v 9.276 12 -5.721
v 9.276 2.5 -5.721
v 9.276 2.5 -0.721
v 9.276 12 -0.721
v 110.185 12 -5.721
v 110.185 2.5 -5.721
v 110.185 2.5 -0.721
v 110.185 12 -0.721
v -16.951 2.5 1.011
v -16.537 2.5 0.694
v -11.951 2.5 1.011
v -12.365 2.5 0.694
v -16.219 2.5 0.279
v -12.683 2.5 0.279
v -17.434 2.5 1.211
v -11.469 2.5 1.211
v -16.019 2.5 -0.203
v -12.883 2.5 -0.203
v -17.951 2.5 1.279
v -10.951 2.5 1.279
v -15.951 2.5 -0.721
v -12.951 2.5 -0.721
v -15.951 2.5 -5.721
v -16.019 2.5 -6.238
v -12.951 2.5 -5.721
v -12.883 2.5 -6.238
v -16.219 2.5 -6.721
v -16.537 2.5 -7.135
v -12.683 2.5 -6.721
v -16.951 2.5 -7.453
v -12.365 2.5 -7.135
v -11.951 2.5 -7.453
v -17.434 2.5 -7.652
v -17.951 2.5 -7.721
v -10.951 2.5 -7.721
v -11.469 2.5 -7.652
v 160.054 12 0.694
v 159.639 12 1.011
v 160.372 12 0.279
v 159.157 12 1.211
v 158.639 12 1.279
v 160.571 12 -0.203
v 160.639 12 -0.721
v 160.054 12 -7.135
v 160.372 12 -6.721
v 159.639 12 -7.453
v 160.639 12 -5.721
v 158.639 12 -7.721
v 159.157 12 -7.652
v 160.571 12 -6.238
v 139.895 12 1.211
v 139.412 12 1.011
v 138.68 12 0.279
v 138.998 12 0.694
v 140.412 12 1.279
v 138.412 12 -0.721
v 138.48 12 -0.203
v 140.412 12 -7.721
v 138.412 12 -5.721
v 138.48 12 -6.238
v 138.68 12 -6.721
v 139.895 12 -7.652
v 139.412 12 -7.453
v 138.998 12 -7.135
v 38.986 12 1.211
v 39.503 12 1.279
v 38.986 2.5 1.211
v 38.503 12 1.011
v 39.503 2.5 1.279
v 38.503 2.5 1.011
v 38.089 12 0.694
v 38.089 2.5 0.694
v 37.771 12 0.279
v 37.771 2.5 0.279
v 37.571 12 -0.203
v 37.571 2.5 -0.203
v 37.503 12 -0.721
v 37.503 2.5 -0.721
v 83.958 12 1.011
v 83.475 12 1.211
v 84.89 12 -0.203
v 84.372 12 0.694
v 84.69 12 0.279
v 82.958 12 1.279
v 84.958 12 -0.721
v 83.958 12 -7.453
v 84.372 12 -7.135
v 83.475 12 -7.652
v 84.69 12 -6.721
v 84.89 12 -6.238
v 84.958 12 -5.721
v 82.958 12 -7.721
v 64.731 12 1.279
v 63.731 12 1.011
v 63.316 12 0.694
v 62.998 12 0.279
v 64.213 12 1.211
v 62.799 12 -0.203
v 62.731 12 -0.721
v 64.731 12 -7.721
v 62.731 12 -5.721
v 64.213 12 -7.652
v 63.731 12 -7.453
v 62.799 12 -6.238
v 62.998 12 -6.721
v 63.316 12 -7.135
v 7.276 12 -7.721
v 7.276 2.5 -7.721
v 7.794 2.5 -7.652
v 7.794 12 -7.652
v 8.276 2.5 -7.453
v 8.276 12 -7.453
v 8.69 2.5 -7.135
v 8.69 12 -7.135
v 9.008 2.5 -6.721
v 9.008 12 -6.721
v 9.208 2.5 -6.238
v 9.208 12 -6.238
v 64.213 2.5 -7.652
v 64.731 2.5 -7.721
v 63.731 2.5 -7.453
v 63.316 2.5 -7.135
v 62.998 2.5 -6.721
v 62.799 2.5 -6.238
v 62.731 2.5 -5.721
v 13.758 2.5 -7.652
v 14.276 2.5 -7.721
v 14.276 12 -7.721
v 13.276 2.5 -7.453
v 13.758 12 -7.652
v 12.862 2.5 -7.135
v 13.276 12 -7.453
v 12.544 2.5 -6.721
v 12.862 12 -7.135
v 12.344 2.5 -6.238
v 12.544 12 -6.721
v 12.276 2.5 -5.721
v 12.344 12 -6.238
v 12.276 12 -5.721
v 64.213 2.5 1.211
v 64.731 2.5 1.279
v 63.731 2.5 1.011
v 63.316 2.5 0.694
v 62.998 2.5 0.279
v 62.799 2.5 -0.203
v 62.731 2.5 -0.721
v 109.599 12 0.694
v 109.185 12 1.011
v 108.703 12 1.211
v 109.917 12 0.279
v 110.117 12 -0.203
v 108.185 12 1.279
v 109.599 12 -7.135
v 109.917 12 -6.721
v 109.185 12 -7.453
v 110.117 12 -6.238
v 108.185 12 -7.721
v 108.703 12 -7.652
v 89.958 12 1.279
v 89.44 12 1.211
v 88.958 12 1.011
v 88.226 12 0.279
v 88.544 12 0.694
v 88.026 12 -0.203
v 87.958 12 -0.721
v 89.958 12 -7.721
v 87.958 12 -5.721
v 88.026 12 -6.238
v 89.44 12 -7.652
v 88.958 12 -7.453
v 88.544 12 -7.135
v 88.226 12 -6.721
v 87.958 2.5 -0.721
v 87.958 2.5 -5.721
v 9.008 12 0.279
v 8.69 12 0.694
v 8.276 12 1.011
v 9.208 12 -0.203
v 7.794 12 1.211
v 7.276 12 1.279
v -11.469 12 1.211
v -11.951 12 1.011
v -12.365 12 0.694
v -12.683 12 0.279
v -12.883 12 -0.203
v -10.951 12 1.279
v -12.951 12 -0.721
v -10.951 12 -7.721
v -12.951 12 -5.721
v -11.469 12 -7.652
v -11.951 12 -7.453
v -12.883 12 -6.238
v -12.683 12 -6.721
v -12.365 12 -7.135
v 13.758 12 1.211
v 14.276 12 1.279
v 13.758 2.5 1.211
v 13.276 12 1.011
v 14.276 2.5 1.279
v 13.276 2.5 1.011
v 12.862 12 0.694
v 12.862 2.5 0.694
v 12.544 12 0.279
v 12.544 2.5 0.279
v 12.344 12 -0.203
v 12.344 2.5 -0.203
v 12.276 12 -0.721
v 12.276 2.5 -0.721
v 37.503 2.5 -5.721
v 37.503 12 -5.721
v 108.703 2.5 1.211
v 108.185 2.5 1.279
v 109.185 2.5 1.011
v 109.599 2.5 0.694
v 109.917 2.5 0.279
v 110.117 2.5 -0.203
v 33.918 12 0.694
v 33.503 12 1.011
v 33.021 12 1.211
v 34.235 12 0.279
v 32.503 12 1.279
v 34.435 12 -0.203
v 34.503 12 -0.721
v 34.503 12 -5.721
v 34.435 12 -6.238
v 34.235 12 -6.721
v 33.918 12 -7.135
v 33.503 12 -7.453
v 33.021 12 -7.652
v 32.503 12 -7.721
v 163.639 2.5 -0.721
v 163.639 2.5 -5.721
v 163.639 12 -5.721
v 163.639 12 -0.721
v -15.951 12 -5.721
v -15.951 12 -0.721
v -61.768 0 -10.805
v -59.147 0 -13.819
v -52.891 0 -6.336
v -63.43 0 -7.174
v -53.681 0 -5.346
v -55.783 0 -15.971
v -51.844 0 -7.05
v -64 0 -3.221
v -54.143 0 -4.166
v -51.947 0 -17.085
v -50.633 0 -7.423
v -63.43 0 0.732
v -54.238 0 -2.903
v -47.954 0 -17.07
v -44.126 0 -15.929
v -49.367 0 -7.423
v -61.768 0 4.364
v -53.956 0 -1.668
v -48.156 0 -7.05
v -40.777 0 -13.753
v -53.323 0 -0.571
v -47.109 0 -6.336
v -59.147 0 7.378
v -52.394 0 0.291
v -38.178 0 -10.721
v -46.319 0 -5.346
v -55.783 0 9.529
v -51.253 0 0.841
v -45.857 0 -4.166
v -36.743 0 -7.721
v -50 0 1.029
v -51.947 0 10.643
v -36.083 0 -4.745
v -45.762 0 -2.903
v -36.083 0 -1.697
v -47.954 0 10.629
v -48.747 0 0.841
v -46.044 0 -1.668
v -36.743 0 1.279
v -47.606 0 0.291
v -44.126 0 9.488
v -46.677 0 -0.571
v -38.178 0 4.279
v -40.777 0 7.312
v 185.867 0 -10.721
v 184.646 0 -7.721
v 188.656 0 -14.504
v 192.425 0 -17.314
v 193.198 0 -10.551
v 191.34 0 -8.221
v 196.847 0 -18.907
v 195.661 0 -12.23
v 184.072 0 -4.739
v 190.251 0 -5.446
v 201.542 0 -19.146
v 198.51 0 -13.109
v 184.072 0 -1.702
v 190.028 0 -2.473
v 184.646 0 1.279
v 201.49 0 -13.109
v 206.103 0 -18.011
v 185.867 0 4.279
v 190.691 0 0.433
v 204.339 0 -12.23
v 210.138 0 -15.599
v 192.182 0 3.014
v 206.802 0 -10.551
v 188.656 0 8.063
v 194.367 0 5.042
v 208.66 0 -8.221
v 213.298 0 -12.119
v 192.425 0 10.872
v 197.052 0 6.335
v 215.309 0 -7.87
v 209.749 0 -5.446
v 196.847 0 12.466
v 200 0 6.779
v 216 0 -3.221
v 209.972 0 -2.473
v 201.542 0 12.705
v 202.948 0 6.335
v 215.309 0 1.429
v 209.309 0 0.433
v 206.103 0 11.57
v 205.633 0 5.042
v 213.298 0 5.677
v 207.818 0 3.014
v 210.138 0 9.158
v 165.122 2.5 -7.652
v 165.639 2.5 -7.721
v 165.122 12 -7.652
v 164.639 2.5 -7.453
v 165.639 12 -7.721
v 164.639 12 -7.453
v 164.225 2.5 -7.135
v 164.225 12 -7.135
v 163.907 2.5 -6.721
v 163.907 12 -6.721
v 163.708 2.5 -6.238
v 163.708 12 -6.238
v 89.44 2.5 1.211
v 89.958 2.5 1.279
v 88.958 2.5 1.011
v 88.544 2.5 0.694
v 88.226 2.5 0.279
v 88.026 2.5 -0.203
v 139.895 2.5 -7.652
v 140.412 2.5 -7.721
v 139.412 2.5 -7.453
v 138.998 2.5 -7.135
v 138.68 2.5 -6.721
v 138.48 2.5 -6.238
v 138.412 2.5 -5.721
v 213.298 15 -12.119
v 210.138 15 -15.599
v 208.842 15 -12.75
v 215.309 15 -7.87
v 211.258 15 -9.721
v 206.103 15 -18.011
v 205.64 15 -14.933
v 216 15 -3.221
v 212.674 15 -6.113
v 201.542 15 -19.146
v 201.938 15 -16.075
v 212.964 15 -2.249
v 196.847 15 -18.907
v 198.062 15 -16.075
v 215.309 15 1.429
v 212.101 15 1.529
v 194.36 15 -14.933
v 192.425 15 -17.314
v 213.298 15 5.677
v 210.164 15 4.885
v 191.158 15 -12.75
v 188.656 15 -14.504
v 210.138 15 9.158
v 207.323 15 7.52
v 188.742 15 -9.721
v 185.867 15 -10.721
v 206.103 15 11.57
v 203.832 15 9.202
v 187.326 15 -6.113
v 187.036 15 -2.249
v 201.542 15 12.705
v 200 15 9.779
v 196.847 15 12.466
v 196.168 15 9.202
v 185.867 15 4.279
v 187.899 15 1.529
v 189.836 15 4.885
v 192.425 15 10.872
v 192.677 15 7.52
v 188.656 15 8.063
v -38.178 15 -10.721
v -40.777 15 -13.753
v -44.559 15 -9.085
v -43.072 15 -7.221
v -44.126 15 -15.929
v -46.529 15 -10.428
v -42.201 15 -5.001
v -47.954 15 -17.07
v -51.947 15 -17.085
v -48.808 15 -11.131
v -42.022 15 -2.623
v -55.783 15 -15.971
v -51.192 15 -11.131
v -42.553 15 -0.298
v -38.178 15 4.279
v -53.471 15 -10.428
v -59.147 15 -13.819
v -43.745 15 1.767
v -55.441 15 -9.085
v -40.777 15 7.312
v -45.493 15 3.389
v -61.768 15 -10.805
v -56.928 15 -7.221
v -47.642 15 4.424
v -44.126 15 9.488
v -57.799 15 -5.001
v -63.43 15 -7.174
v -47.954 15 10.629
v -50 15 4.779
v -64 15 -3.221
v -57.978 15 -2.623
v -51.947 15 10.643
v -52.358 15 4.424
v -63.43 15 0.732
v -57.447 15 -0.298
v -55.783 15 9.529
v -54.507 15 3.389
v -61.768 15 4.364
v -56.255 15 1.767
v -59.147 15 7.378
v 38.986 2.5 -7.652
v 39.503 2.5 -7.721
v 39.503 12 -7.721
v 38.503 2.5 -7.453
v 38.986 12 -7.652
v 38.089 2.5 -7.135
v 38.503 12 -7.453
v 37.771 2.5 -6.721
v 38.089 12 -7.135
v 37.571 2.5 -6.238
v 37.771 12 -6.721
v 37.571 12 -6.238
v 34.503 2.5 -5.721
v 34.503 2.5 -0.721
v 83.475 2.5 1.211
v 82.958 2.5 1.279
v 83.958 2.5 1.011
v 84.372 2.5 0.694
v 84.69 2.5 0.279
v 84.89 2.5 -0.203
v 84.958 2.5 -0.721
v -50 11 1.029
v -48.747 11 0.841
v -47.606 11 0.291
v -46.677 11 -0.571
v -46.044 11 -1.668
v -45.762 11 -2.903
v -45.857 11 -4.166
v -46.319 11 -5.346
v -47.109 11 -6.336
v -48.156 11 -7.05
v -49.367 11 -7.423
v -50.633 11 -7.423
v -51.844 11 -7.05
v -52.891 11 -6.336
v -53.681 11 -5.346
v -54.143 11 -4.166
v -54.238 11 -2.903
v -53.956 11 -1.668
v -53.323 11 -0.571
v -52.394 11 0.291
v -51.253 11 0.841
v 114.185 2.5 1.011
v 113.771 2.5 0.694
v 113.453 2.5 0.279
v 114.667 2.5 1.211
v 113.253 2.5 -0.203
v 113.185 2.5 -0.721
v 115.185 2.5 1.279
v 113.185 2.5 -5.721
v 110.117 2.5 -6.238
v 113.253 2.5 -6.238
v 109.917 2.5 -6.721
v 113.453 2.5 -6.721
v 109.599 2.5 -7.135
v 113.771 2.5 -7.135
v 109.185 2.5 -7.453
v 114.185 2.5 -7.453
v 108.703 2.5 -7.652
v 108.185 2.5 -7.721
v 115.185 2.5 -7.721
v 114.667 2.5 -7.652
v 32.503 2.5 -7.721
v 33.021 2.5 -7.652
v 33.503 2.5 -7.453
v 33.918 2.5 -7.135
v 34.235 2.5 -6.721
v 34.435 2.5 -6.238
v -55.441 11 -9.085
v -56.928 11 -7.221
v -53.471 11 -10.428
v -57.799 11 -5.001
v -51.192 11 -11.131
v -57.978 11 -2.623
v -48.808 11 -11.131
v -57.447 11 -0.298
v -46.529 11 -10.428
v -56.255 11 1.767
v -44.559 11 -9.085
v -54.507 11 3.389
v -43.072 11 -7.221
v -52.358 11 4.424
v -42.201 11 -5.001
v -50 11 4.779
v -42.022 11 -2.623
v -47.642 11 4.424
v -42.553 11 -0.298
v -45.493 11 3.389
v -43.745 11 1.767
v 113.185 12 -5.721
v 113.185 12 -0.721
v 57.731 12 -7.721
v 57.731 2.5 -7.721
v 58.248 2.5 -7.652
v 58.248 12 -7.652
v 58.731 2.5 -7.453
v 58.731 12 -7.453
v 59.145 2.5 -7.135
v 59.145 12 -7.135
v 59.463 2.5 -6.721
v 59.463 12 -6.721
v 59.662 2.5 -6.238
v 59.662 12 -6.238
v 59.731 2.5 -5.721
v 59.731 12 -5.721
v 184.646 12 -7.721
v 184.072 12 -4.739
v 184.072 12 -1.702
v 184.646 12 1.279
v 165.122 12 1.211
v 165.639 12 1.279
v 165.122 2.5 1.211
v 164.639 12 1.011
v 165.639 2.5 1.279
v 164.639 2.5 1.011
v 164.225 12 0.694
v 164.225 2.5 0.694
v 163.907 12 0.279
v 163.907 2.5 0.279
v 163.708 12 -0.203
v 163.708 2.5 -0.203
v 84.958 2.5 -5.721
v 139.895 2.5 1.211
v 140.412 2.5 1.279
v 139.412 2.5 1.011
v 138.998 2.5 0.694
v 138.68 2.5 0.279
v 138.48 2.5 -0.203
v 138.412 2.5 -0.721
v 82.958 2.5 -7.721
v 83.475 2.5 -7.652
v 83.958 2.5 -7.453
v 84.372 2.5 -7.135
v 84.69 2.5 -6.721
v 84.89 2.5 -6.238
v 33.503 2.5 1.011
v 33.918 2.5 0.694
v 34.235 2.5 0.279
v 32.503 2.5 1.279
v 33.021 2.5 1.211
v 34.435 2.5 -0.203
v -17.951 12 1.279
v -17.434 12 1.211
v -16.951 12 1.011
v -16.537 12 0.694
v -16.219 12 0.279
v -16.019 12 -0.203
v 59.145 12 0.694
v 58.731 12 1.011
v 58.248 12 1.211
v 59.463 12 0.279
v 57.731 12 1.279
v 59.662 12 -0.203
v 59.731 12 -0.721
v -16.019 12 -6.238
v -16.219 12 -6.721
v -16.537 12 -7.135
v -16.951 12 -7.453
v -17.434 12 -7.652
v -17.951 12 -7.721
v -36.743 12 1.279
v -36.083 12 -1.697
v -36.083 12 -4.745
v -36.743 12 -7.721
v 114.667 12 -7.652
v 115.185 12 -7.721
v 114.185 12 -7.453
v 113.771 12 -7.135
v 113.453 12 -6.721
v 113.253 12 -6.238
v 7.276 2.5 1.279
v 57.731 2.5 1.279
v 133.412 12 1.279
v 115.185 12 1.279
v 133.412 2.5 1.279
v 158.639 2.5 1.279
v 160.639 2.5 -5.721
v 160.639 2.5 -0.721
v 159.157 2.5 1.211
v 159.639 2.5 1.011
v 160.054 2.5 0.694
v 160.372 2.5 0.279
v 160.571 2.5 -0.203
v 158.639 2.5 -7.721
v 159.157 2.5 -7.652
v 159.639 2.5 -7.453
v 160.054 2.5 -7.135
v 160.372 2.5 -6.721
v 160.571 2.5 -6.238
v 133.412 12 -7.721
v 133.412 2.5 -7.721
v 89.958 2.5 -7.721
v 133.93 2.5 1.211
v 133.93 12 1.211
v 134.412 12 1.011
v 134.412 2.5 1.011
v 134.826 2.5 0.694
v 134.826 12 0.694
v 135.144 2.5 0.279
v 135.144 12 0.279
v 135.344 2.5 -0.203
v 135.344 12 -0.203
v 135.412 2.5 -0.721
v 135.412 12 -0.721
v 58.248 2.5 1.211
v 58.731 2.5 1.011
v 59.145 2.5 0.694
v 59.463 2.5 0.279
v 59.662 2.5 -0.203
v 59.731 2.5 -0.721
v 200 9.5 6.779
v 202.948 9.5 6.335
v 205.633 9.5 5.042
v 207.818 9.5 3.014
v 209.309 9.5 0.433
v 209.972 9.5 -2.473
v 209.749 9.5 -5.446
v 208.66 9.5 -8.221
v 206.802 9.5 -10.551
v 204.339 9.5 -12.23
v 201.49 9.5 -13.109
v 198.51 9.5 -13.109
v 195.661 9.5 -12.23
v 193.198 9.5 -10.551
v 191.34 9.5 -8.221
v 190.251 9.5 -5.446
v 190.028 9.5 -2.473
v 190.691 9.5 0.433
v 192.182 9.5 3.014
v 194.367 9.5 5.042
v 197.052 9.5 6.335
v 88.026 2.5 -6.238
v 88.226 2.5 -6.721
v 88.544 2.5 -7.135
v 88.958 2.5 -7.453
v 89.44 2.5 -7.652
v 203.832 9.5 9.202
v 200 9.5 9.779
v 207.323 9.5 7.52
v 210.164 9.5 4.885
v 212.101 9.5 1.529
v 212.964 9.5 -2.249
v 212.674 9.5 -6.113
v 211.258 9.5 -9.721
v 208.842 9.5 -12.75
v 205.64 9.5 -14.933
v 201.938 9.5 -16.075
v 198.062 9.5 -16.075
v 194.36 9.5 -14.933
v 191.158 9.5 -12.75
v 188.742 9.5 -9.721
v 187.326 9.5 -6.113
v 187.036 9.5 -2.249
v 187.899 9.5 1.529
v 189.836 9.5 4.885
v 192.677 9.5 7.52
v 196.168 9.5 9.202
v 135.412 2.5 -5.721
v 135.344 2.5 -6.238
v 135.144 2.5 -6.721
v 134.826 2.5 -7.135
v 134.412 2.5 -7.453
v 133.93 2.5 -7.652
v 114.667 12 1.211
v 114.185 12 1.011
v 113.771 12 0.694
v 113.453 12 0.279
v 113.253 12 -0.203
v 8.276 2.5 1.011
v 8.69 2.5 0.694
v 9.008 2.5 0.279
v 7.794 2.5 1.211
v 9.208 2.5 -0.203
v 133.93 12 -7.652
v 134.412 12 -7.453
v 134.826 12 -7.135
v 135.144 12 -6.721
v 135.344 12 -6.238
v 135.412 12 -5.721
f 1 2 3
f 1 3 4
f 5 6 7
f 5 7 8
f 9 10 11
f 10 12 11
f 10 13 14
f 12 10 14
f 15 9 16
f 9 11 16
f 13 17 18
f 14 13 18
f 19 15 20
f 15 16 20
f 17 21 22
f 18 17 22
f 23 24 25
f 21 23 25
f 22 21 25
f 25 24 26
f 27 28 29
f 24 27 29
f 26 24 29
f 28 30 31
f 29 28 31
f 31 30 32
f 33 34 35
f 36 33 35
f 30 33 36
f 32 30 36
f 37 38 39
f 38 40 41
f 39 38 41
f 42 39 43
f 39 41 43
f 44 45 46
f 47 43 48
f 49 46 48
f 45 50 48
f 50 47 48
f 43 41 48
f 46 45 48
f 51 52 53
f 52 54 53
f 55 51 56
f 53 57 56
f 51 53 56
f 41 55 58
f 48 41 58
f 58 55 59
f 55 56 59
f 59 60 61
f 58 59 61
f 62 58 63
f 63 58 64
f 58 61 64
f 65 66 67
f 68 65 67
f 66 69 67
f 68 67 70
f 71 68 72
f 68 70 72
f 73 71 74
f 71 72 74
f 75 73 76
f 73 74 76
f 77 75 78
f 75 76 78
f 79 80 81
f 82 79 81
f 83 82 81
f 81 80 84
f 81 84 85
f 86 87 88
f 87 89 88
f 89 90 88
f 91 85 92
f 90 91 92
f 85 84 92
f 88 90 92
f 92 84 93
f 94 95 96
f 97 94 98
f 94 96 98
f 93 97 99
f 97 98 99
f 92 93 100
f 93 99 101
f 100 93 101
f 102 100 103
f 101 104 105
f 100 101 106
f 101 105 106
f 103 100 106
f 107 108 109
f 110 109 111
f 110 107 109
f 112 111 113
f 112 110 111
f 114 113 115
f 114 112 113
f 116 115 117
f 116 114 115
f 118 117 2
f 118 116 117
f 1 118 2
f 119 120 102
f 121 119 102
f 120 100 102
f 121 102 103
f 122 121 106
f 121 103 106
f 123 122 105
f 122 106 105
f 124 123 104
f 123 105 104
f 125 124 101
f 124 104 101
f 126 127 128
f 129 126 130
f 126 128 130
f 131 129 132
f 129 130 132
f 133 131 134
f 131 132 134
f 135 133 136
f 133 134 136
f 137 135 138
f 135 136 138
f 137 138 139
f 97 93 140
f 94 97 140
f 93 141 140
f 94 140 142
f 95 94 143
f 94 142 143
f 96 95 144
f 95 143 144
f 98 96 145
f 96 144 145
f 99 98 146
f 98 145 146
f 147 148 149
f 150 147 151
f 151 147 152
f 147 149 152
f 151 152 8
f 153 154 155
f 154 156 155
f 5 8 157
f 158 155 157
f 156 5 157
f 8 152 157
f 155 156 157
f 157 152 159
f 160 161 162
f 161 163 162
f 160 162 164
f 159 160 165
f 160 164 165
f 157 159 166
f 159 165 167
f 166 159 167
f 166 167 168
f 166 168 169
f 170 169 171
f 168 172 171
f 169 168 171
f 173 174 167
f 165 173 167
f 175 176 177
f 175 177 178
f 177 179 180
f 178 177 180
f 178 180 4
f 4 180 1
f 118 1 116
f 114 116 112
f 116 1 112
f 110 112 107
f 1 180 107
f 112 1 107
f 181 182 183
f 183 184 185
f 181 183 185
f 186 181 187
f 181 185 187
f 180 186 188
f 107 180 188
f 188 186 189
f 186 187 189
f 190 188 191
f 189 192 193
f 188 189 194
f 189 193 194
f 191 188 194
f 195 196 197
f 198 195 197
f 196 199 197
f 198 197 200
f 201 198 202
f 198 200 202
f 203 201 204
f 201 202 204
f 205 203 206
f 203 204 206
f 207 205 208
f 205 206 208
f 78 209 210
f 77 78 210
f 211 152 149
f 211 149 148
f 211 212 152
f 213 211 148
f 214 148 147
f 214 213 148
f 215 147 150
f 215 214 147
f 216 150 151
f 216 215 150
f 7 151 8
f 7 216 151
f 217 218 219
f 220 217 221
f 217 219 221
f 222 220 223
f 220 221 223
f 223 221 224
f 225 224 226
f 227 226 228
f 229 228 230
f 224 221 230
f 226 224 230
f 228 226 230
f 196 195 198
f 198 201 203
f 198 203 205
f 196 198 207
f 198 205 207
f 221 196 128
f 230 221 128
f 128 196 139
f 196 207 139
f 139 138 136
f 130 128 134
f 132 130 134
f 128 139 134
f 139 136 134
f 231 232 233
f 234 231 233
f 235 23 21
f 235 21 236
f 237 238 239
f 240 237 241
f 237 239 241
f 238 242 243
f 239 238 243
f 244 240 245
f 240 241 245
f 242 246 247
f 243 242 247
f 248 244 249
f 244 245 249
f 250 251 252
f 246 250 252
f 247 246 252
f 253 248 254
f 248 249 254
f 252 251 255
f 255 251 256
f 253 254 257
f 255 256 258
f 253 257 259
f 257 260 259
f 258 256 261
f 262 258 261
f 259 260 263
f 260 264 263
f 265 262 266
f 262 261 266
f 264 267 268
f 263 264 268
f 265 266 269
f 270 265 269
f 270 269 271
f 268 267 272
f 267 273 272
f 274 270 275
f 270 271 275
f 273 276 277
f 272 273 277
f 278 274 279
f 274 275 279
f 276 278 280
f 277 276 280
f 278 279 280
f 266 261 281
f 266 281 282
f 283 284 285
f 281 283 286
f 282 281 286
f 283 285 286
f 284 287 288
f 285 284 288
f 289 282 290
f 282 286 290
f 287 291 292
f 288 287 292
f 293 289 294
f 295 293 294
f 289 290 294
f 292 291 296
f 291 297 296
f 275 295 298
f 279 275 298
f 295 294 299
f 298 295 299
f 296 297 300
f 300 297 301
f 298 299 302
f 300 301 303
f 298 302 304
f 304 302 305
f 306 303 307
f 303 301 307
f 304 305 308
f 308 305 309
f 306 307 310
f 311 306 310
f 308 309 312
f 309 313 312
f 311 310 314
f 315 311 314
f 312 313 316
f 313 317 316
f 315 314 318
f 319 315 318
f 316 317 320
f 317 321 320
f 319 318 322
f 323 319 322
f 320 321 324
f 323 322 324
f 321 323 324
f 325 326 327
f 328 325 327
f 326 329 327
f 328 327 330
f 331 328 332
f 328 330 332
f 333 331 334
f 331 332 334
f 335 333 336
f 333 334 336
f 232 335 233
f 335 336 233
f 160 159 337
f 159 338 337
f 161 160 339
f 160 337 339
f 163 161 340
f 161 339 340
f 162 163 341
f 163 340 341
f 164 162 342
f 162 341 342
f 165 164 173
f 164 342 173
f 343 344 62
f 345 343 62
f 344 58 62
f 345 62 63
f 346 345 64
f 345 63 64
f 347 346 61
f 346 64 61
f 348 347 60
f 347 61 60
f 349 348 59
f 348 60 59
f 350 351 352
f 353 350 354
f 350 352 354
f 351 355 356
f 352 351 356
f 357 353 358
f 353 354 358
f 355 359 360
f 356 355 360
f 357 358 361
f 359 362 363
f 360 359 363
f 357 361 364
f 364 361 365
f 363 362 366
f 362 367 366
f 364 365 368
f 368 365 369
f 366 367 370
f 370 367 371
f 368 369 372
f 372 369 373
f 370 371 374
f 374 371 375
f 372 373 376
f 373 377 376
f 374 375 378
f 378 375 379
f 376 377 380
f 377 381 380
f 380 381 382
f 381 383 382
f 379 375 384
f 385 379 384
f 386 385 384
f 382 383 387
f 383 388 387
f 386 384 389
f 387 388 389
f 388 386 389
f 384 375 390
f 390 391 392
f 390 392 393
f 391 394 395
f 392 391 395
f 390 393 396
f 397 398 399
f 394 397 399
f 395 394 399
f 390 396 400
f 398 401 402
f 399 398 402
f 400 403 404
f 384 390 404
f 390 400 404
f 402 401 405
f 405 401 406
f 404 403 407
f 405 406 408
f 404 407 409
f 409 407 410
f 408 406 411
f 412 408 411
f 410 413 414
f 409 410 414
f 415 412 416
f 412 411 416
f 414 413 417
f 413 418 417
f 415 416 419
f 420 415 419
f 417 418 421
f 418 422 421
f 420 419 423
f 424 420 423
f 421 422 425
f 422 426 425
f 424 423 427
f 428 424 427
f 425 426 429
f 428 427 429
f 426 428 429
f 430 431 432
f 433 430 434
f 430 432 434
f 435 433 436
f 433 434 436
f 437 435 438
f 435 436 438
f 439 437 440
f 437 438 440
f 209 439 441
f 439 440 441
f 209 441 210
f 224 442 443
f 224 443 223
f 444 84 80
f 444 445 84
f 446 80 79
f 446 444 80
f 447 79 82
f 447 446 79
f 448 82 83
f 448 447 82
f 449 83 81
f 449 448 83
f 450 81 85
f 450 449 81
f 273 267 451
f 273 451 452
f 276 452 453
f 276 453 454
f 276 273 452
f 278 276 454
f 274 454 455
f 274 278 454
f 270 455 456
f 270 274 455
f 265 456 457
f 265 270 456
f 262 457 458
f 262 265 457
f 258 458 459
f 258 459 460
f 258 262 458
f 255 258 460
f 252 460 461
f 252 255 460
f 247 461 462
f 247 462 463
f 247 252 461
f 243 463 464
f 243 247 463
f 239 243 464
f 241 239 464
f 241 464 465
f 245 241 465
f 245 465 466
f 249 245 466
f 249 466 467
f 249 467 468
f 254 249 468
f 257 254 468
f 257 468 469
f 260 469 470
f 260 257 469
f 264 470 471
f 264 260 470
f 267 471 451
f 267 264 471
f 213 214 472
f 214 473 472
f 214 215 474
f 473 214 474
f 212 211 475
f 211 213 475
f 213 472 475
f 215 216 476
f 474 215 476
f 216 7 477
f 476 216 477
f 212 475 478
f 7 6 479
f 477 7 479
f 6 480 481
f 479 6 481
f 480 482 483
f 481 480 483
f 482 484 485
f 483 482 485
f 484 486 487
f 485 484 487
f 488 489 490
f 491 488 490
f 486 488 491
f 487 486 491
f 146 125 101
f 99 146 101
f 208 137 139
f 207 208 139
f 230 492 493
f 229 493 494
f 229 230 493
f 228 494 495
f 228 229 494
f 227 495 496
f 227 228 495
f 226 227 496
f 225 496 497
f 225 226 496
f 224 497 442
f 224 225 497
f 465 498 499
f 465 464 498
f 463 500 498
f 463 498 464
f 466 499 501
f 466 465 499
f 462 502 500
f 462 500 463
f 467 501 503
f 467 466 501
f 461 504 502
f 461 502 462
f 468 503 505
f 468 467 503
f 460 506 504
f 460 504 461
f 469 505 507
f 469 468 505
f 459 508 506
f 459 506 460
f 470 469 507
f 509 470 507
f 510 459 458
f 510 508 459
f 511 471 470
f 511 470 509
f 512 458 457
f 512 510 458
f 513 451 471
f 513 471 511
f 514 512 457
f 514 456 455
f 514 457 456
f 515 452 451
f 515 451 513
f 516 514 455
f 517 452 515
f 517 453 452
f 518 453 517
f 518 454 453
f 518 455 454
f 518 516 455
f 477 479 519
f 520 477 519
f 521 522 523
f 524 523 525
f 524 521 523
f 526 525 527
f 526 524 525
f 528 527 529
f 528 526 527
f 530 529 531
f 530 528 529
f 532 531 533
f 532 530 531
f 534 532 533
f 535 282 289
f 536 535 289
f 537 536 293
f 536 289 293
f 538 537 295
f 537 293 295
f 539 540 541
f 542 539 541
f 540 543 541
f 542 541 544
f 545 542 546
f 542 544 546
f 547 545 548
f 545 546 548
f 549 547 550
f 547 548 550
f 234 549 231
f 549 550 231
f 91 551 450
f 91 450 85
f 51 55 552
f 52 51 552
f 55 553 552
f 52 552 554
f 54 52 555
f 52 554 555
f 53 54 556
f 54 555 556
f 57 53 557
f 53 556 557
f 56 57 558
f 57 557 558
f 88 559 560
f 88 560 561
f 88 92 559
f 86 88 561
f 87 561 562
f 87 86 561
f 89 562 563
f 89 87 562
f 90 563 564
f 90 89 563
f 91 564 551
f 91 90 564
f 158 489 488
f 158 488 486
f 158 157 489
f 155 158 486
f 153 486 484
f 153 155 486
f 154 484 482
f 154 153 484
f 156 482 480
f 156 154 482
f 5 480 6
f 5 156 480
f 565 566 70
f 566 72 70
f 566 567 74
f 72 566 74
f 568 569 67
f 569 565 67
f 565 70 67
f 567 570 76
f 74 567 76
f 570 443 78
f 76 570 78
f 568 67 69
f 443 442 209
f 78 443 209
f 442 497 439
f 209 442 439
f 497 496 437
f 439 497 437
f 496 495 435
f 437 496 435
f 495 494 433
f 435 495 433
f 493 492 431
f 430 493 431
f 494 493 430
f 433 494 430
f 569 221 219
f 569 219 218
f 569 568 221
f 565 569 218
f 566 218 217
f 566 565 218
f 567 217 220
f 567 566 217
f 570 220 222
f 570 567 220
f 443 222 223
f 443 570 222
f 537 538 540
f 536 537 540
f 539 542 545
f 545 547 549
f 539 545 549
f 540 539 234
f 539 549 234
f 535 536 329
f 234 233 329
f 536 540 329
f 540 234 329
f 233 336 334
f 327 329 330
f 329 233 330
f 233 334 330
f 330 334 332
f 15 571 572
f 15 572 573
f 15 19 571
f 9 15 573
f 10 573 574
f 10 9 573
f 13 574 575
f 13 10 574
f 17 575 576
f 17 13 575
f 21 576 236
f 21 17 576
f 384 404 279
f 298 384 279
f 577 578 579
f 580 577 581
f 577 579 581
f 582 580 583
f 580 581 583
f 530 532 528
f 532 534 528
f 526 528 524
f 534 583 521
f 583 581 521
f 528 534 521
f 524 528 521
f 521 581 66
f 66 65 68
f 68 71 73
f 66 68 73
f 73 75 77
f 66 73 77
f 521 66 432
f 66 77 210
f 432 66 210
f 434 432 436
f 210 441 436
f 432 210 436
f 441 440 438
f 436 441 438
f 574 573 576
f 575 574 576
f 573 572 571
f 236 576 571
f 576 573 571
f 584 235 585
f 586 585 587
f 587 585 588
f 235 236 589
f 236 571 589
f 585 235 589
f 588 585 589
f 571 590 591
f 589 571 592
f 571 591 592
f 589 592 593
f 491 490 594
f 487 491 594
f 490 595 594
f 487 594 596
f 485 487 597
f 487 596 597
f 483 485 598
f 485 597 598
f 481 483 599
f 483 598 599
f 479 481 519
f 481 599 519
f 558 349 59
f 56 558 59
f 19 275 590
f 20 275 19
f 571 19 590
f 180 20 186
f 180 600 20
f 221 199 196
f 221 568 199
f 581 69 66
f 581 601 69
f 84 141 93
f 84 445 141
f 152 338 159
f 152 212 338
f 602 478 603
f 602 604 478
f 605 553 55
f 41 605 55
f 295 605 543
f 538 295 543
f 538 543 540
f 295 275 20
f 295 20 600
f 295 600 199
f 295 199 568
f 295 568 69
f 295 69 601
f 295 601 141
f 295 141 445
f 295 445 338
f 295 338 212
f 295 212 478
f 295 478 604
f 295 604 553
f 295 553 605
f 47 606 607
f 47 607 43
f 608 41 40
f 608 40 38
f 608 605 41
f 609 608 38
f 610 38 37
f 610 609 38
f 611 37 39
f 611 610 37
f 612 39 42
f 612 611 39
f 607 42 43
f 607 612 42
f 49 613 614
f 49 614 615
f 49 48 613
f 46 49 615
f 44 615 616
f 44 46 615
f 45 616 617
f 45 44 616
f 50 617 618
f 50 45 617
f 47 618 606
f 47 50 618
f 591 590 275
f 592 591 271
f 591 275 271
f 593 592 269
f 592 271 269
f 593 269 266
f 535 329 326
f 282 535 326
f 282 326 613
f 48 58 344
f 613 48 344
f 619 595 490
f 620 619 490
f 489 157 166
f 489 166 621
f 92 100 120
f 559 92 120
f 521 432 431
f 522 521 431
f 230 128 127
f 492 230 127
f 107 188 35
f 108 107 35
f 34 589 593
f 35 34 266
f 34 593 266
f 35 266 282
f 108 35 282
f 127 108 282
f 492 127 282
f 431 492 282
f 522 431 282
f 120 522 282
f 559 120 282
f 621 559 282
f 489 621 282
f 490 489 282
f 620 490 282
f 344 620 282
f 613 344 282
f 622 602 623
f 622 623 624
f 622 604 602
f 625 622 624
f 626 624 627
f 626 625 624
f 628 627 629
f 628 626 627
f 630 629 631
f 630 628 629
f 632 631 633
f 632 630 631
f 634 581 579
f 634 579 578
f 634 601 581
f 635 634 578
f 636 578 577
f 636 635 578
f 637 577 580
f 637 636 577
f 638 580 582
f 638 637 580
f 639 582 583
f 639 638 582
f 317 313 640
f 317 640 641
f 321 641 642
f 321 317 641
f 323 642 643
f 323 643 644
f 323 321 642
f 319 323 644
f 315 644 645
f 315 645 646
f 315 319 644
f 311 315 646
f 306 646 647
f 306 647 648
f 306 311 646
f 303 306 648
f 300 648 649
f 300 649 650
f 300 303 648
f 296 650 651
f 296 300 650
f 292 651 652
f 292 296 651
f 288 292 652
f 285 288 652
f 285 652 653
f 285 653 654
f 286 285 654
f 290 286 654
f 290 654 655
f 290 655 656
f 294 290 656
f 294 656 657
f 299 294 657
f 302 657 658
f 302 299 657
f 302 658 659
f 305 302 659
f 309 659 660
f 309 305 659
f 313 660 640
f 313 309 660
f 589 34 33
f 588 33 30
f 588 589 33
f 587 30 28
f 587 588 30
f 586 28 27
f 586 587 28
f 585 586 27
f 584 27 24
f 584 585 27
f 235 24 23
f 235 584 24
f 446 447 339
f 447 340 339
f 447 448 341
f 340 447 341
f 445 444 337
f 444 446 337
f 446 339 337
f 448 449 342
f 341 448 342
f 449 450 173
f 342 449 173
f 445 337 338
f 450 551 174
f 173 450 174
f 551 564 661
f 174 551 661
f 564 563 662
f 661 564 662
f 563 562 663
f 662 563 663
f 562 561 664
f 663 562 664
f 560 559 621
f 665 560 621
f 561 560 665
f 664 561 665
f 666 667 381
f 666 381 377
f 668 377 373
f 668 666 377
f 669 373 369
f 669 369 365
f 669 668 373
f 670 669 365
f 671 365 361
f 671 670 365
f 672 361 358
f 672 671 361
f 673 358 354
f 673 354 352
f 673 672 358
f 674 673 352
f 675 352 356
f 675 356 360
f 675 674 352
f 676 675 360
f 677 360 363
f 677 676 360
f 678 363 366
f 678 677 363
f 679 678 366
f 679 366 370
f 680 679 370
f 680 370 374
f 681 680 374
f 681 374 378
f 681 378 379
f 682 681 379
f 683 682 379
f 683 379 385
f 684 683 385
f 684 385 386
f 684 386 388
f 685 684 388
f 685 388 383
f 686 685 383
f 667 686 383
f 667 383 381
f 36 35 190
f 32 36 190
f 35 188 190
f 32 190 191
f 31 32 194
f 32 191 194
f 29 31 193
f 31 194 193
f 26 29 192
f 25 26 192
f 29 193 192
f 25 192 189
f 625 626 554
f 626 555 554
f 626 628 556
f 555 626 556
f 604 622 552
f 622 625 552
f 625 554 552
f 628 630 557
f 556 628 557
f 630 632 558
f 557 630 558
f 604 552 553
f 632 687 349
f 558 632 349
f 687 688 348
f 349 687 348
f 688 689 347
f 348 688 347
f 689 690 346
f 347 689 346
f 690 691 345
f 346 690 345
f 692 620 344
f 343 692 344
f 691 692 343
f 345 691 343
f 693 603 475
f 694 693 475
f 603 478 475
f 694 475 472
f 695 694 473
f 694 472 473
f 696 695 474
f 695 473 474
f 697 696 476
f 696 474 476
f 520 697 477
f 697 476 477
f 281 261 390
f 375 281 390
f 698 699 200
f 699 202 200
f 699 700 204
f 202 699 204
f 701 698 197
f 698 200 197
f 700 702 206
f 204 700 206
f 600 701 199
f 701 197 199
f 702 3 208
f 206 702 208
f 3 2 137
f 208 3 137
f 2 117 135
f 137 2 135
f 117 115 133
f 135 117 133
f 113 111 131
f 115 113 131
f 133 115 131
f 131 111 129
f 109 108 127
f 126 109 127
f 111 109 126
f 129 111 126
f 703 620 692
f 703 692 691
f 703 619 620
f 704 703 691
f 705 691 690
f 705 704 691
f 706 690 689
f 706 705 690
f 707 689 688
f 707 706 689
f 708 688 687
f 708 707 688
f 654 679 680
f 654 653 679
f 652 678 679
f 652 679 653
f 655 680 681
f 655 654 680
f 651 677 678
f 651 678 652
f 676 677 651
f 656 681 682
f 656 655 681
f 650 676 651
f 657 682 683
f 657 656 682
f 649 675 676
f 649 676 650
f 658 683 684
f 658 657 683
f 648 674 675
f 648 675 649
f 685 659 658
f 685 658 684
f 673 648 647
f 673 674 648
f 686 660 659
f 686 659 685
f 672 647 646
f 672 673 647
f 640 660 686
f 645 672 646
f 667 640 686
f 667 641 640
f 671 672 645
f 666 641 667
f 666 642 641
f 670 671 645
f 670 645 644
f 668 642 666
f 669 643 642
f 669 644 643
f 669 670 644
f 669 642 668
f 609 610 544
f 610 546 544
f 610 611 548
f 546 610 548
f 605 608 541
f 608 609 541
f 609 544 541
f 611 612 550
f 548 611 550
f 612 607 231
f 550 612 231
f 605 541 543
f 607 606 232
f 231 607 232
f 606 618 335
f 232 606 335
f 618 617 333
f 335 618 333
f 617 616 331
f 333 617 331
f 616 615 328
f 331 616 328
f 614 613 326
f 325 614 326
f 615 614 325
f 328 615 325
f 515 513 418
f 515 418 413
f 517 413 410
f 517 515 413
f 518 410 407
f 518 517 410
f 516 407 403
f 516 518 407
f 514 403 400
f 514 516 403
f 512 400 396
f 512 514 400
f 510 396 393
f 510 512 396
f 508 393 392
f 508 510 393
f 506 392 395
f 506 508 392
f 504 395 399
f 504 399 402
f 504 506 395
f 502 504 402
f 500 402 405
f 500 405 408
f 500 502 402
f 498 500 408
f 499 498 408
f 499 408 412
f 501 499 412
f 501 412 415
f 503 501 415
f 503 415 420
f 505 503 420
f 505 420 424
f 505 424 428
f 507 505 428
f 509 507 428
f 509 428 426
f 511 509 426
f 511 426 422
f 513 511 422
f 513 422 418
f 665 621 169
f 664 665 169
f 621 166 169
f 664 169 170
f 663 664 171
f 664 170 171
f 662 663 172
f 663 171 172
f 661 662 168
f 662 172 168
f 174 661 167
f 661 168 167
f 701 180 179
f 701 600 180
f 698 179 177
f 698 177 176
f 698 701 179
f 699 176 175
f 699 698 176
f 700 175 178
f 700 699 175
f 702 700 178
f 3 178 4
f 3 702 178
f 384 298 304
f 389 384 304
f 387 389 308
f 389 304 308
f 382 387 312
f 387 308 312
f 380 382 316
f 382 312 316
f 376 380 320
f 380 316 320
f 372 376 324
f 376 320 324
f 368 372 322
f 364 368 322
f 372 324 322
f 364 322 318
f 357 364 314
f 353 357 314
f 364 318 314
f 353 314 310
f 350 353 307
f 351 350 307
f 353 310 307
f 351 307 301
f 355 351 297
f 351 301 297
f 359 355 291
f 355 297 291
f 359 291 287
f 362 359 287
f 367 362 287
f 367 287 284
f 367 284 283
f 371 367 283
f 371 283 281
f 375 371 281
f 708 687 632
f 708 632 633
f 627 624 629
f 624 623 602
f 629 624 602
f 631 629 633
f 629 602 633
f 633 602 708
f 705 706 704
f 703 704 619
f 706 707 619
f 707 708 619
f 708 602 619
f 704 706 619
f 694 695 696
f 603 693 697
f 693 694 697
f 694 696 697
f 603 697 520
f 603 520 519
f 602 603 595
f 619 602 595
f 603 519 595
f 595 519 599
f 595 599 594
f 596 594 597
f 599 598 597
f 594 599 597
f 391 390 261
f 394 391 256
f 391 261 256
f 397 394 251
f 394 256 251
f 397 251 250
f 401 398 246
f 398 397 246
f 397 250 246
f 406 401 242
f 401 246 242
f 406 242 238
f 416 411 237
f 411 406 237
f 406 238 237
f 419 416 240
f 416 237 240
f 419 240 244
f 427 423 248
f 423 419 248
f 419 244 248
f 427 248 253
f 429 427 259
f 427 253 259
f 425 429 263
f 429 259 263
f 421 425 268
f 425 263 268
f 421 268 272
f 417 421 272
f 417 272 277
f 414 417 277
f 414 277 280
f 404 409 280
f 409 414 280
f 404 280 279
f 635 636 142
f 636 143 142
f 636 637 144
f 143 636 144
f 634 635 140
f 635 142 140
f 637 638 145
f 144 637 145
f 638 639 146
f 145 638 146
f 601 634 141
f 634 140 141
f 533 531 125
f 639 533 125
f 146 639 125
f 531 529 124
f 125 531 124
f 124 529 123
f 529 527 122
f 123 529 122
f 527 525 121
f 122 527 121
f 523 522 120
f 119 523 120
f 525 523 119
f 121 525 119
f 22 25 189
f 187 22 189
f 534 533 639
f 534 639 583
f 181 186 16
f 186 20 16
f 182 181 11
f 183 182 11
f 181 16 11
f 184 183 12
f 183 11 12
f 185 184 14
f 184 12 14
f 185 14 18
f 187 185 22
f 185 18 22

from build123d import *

# Parameters (mm, degrees)
SKETCH2_R                             = 14
SKETCH2_R_2                           = 8
BOSS_EXTRUDE7_DEPTH                   = 15
SKETCH2_9_R                           = 16
SKETCH2_9_R_2                         = 13
BOSS_EXTRUDE8_DEPTH                   = 15
SKETCH2_11_R                          = 13
SKETCH2_11_R_2                        = 10
BOSS_EXTRUDE9_DEPTH                   = 9.5
BOSS_EXTRUDE11_REACH                  = 219.372
BOSS_EXTRUDE11_END_RADIUS             = 14
BOSS_EXTRUDE11_DIRECTION_2_REACH      = 219.372
BOSS_EXTRUDE11_DIRECTION_2_END_RADIUS = 16
BOSS_EXTRUDE12_REACH                  = 219.489
SKETCH15_W                            = 3
SKETCH15_H                            = 9.5
FILLET1_R                             = 2
SKETCH2_13_R                          = 8
SKETCH2_13_R_2                        = 4.25
BOSS_EXTRUDE13_DEPTH                  = 11


with BuildPart() as part:
    # Sketch2 → Boss-Extrude7 (new body)
    with BuildSketch(Plane(origin=(0, 0, 0), x_dir=(1, 0, 0), z_dir=(0, 1, 0))):
        with Locations(Location((-50, 3.220631283, 0), (0, 0, 270))):
            Circle(SKETCH2_R)
        with Locations(Location((-50, 3.220631283, 0), (0, 0, 270))):
            Circle(SKETCH2_R_2, mode=Mode.SUBTRACT)
    extrude(amount=BOSS_EXTRUDE7_DEPTH)


with BuildPart() as body_2:
    # Sketch2<9> → Boss-Extrude8 (new body)
    with BuildSketch(Plane(origin=(0, 0, 0), x_dir=(1, 0, 0), z_dir=(0, 1, 0))):
        with Locations(Location((200, 3.220631283, 0), (0, 0, 270))):
            Circle(SKETCH2_9_R)
        with Locations(Location((200, 3.220631283, 0), (0, 0, 270))):
            Circle(SKETCH2_9_R_2, mode=Mode.SUBTRACT)
    extrude(amount=BOSS_EXTRUDE8_DEPTH)

    # Sketch2<11> → Boss-Extrude9 (add)
    with BuildSketch(Plane(origin=(0, 0, 0), x_dir=(1, 0, 0), z_dir=(0, 1, 0))):
        with Locations(Location((200, 3.220631283, 0), (0, 0, 270))):
            Circle(SKETCH2_11_R)
        with Locations(Location((200, 3.220631283, 0), (0, 0, 270))):
            Circle(SKETCH2_11_R_2, mode=Mode.SUBTRACT)
    extrude(amount=BOSS_EXTRUDE9_DEPTH)


    add(part.part)  # Boss-Extrude11 merges part
    # Boss-Extrude11: up to this cylinder (the profile starts outside it)
    boss_extrude11_end = Plane(origin=(-50, 0.212132, -3.220631283), z_dir=(0, -1, 0)) * Cylinder(BOSS_EXTRUDE11_END_RADIUS, 467.744, mode=Mode.PRIVATE)
    # Sketch3 → Boss-Extrude11 (add, up to the surface)
    with BuildSketch(Plane(origin=(0, 0, 0), x_dir=(0, 0, -1), z_dir=(1, 0, 0)), mode=Mode.PRIVATE) as boss_extrude11_sk1:
        Polygon((10.720631283, 0), (10.720631283, 15), (-4.279368717, 15), (-4.279368717, 0), (-1.279368717, 0), (-1.279368717, 12), (7.720631283, 12), (7.720631283, 0), align=None)
    boss_extrude11_tool1 = extrude(boss_extrude11_sk1.sketch, amount=-BOSS_EXTRUDE11_REACH, mode=Mode.PRIVATE) - boss_extrude11_end
    add(boss_extrude11_tool1.solids().sort_by_distance((0, 0.212132, -9.220631))[0])

    # Boss-Extrude11 direction 2: up to this cylinder (the profile starts outside it)
    boss_extrude11_direction_2_end = Plane(origin=(200, 0.212132, -3.220631283), z_dir=(0, -1, 0)) * Cylinder(BOSS_EXTRUDE11_DIRECTION_2_END_RADIUS, 471.744, mode=Mode.PRIVATE)
    # Sketch3 → Boss-Extrude11 direction 2 (add, up to the surface)
    with BuildSketch(Plane(origin=(0, 0, 0), x_dir=(0, 0, -1), z_dir=(1, 0, 0)), mode=Mode.PRIVATE) as boss_extrude11_direction_2_sk1:
        Polygon((10.720631283, 0), (10.720631283, 15), (-4.279368717, 15), (-4.279368717, 0), (-1.279368717, 0), (-1.279368717, 12), (7.720631283, 12), (7.720631283, 0), align=None)
    boss_extrude11_direction_2_tool1 = extrude(boss_extrude11_direction_2_sk1.sketch, amount=BOSS_EXTRUDE11_DIRECTION_2_REACH, mode=Mode.PRIVATE) - boss_extrude11_direction_2_end
    add(boss_extrude11_direction_2_tool1.solids().sort_by_distance((0, 0.212132, -9.220631))[0])

    # Sketch15 → Boss-Extrude12 (add, up to next)
    with BuildSketch(Plane.XY.offset(-7.720631283), mode=Mode.PRIVATE) as boss_extrude12_sk1:
        with Locations((-14.45117452, 7.25)):
            Rectangle(SKETCH15_W, SKETCH15_H)
    boss_extrude12_tool1 = extrude(boss_extrude12_sk1.sketch, amount=BOSS_EXTRUDE12_REACH, mode=Mode.PRIVATE) - body_2.part
    # Sketch15 → Boss-Extrude12 (add, up to next)
    with BuildSketch(Plane.XY.offset(-7.720631283), mode=Mode.PRIVATE) as boss_extrude12_sk2:
        with Locations((86.457765729, 7.25)):
            Rectangle(SKETCH15_W, SKETCH15_H)
    boss_extrude12_tool2 = extrude(boss_extrude12_sk2.sketch, amount=BOSS_EXTRUDE12_REACH, mode=Mode.PRIVATE) - body_2.part
    # Sketch15 → Boss-Extrude12 (add, up to next)
    with BuildSketch(Plane.XY.offset(-7.720631283), mode=Mode.PRIVATE) as boss_extrude12_sk3:
        with Locations((10.776060542, 7.25)):
            Rectangle(SKETCH15_W, SKETCH15_H)
    boss_extrude12_tool3 = extrude(boss_extrude12_sk3.sketch, amount=BOSS_EXTRUDE12_REACH, mode=Mode.PRIVATE) - body_2.part
    # Sketch15 → Boss-Extrude12 (add, up to next)
    with BuildSketch(Plane.XY.offset(-7.720631283), mode=Mode.PRIVATE) as boss_extrude12_sk4:
        with Locations((36.003295604, 7.25)):
            Rectangle(SKETCH15_W, SKETCH15_H)
    boss_extrude12_tool4 = extrude(boss_extrude12_sk4.sketch, amount=BOSS_EXTRUDE12_REACH, mode=Mode.PRIVATE) - body_2.part
    # Sketch15 → Boss-Extrude12 (add, up to next)
    with BuildSketch(Plane.XY.offset(-7.720631283), mode=Mode.PRIVATE) as boss_extrude12_sk5:
        with Locations((61.230530666, 7.25)):
            Rectangle(SKETCH15_W, SKETCH15_H)
    boss_extrude12_tool5 = extrude(boss_extrude12_sk5.sketch, amount=BOSS_EXTRUDE12_REACH, mode=Mode.PRIVATE) - body_2.part
    # Sketch15 → Boss-Extrude12 (add, up to next)
    with BuildSketch(Plane.XY.offset(-7.720631283), mode=Mode.PRIVATE) as boss_extrude12_sk6:
        with Locations((111.685000791, 7.25)):
            Rectangle(SKETCH15_W, SKETCH15_H)
    boss_extrude12_tool6 = extrude(boss_extrude12_sk6.sketch, amount=BOSS_EXTRUDE12_REACH, mode=Mode.PRIVATE) - body_2.part
    # Sketch15 → Boss-Extrude12 (add, up to next)
    with BuildSketch(Plane.XY.offset(-7.720631283), mode=Mode.PRIVATE) as boss_extrude12_sk7:
        with Locations((136.912235853, 7.25)):
            Rectangle(SKETCH15_W, SKETCH15_H)
    boss_extrude12_tool7 = extrude(boss_extrude12_sk7.sketch, amount=BOSS_EXTRUDE12_REACH, mode=Mode.PRIVATE) - body_2.part
    # Sketch15 → Boss-Extrude12 (add, up to next)
    with BuildSketch(Plane.XY.offset(-7.720631283), mode=Mode.PRIVATE) as boss_extrude12_sk8:
        with Locations((162.139470915, 7.25)):
            Rectangle(SKETCH15_W, SKETCH15_H)
    boss_extrude12_tool8 = extrude(boss_extrude12_sk8.sketch, amount=BOSS_EXTRUDE12_REACH, mode=Mode.PRIVATE) - body_2.part
    add(boss_extrude12_tool1.solids().sort_by_distance((-14.451175, 7.25, -7.720631))[0])
    add(boss_extrude12_tool2.solids().sort_by_distance((86.457766, 7.25, -7.720631))[0])
    add(boss_extrude12_tool3.solids().sort_by_distance((10.776061, 7.25, -7.720631))[0])
    add(boss_extrude12_tool4.solids().sort_by_distance((36.003296, 7.25, -7.720631))[0])
    add(boss_extrude12_tool5.solids().sort_by_distance((61.230531, 7.25, -7.720631))[0])
    add(boss_extrude12_tool6.solids().sort_by_distance((111.685001, 7.25, -7.720631))[0])
    add(boss_extrude12_tool7.solids().sort_by_distance((136.912236, 7.25, -7.720631))[0])
    add(boss_extrude12_tool8.solids().sort_by_distance((162.139471, 7.25, -7.720631))[0])

    # Fillet1
    fillet1_edges = [body_2.edges().sort_by_distance(p)[0] for p in [
        (59.730530666, 7.25, 1.279368717),
        (62.730530666, 7.25, 1.279368717),
        (62.730530666, 7.25, -7.720631283),
        (59.730530666, 7.25, -7.720631283),
        (110.185000791, 7.25, 1.279368717),
        (113.185000791, 7.25, 1.279368717),
        (113.185000791, 7.25, -7.720631283),
        (110.185000791, 7.25, -7.720631283),
        (135.412235853, 7.25, 1.279368717),
        (138.412235853, 7.25, 1.279368717),
        (138.412235853, 7.25, -7.720631283),
        (135.412235853, 7.25, -7.720631283),
        (160.639470915, 7.25, 1.279368717),
        (163.639470915, 7.25, 1.279368717),
        (163.639470915, 7.25, -7.720631283),
        (160.639470915, 7.25, -7.720631283),
        (-15.95117452, 7.25, 1.279368717),
        (-12.95117452, 7.25, 1.279368717),
        (-12.95117452, 7.25, -7.720631283),
        (-15.95117452, 7.25, -7.720631283),
        (84.957765729, 7.25, 1.279368717),
        (87.957765729, 7.25, 1.279368717),
        (87.957765729, 7.25, -7.720631283),
        (84.957765729, 7.25, -7.720631283),
        (12.276060542, 7.25, 1.279368717),
        (9.276060542, 7.25, 1.279368717),
        (12.276060542, 7.25, -7.720631283),
        (9.276060542, 7.25, -7.720631283),
        (34.503295604, 7.25, 1.279368717),
        (37.503295604, 7.25, 1.279368717),
        (37.503295604, 7.25, -7.720631283),
        (34.503295604, 7.25, -7.720631283),
    ]]
    fillet(fillet1_edges, radius=FILLET1_R)

    # Sketch2<13> → Boss-Extrude13 (add)
    with BuildSketch(Plane(origin=(0, 0, 0), x_dir=(1, 0, 0), z_dir=(0, 1, 0))):
        with Locations(Location((-50, 3.220631283, 0), (0, 0, 270))):
            Circle(SKETCH2_13_R)
        with Locations(Location((-50, 3.220631283, 0), (0, 0, 270))):
            Circle(SKETCH2_13_R_2, mode=Mode.SUBTRACT)
    extrude(amount=BOSS_EXTRUDE13_DEPTH)


solid = body_2.part
